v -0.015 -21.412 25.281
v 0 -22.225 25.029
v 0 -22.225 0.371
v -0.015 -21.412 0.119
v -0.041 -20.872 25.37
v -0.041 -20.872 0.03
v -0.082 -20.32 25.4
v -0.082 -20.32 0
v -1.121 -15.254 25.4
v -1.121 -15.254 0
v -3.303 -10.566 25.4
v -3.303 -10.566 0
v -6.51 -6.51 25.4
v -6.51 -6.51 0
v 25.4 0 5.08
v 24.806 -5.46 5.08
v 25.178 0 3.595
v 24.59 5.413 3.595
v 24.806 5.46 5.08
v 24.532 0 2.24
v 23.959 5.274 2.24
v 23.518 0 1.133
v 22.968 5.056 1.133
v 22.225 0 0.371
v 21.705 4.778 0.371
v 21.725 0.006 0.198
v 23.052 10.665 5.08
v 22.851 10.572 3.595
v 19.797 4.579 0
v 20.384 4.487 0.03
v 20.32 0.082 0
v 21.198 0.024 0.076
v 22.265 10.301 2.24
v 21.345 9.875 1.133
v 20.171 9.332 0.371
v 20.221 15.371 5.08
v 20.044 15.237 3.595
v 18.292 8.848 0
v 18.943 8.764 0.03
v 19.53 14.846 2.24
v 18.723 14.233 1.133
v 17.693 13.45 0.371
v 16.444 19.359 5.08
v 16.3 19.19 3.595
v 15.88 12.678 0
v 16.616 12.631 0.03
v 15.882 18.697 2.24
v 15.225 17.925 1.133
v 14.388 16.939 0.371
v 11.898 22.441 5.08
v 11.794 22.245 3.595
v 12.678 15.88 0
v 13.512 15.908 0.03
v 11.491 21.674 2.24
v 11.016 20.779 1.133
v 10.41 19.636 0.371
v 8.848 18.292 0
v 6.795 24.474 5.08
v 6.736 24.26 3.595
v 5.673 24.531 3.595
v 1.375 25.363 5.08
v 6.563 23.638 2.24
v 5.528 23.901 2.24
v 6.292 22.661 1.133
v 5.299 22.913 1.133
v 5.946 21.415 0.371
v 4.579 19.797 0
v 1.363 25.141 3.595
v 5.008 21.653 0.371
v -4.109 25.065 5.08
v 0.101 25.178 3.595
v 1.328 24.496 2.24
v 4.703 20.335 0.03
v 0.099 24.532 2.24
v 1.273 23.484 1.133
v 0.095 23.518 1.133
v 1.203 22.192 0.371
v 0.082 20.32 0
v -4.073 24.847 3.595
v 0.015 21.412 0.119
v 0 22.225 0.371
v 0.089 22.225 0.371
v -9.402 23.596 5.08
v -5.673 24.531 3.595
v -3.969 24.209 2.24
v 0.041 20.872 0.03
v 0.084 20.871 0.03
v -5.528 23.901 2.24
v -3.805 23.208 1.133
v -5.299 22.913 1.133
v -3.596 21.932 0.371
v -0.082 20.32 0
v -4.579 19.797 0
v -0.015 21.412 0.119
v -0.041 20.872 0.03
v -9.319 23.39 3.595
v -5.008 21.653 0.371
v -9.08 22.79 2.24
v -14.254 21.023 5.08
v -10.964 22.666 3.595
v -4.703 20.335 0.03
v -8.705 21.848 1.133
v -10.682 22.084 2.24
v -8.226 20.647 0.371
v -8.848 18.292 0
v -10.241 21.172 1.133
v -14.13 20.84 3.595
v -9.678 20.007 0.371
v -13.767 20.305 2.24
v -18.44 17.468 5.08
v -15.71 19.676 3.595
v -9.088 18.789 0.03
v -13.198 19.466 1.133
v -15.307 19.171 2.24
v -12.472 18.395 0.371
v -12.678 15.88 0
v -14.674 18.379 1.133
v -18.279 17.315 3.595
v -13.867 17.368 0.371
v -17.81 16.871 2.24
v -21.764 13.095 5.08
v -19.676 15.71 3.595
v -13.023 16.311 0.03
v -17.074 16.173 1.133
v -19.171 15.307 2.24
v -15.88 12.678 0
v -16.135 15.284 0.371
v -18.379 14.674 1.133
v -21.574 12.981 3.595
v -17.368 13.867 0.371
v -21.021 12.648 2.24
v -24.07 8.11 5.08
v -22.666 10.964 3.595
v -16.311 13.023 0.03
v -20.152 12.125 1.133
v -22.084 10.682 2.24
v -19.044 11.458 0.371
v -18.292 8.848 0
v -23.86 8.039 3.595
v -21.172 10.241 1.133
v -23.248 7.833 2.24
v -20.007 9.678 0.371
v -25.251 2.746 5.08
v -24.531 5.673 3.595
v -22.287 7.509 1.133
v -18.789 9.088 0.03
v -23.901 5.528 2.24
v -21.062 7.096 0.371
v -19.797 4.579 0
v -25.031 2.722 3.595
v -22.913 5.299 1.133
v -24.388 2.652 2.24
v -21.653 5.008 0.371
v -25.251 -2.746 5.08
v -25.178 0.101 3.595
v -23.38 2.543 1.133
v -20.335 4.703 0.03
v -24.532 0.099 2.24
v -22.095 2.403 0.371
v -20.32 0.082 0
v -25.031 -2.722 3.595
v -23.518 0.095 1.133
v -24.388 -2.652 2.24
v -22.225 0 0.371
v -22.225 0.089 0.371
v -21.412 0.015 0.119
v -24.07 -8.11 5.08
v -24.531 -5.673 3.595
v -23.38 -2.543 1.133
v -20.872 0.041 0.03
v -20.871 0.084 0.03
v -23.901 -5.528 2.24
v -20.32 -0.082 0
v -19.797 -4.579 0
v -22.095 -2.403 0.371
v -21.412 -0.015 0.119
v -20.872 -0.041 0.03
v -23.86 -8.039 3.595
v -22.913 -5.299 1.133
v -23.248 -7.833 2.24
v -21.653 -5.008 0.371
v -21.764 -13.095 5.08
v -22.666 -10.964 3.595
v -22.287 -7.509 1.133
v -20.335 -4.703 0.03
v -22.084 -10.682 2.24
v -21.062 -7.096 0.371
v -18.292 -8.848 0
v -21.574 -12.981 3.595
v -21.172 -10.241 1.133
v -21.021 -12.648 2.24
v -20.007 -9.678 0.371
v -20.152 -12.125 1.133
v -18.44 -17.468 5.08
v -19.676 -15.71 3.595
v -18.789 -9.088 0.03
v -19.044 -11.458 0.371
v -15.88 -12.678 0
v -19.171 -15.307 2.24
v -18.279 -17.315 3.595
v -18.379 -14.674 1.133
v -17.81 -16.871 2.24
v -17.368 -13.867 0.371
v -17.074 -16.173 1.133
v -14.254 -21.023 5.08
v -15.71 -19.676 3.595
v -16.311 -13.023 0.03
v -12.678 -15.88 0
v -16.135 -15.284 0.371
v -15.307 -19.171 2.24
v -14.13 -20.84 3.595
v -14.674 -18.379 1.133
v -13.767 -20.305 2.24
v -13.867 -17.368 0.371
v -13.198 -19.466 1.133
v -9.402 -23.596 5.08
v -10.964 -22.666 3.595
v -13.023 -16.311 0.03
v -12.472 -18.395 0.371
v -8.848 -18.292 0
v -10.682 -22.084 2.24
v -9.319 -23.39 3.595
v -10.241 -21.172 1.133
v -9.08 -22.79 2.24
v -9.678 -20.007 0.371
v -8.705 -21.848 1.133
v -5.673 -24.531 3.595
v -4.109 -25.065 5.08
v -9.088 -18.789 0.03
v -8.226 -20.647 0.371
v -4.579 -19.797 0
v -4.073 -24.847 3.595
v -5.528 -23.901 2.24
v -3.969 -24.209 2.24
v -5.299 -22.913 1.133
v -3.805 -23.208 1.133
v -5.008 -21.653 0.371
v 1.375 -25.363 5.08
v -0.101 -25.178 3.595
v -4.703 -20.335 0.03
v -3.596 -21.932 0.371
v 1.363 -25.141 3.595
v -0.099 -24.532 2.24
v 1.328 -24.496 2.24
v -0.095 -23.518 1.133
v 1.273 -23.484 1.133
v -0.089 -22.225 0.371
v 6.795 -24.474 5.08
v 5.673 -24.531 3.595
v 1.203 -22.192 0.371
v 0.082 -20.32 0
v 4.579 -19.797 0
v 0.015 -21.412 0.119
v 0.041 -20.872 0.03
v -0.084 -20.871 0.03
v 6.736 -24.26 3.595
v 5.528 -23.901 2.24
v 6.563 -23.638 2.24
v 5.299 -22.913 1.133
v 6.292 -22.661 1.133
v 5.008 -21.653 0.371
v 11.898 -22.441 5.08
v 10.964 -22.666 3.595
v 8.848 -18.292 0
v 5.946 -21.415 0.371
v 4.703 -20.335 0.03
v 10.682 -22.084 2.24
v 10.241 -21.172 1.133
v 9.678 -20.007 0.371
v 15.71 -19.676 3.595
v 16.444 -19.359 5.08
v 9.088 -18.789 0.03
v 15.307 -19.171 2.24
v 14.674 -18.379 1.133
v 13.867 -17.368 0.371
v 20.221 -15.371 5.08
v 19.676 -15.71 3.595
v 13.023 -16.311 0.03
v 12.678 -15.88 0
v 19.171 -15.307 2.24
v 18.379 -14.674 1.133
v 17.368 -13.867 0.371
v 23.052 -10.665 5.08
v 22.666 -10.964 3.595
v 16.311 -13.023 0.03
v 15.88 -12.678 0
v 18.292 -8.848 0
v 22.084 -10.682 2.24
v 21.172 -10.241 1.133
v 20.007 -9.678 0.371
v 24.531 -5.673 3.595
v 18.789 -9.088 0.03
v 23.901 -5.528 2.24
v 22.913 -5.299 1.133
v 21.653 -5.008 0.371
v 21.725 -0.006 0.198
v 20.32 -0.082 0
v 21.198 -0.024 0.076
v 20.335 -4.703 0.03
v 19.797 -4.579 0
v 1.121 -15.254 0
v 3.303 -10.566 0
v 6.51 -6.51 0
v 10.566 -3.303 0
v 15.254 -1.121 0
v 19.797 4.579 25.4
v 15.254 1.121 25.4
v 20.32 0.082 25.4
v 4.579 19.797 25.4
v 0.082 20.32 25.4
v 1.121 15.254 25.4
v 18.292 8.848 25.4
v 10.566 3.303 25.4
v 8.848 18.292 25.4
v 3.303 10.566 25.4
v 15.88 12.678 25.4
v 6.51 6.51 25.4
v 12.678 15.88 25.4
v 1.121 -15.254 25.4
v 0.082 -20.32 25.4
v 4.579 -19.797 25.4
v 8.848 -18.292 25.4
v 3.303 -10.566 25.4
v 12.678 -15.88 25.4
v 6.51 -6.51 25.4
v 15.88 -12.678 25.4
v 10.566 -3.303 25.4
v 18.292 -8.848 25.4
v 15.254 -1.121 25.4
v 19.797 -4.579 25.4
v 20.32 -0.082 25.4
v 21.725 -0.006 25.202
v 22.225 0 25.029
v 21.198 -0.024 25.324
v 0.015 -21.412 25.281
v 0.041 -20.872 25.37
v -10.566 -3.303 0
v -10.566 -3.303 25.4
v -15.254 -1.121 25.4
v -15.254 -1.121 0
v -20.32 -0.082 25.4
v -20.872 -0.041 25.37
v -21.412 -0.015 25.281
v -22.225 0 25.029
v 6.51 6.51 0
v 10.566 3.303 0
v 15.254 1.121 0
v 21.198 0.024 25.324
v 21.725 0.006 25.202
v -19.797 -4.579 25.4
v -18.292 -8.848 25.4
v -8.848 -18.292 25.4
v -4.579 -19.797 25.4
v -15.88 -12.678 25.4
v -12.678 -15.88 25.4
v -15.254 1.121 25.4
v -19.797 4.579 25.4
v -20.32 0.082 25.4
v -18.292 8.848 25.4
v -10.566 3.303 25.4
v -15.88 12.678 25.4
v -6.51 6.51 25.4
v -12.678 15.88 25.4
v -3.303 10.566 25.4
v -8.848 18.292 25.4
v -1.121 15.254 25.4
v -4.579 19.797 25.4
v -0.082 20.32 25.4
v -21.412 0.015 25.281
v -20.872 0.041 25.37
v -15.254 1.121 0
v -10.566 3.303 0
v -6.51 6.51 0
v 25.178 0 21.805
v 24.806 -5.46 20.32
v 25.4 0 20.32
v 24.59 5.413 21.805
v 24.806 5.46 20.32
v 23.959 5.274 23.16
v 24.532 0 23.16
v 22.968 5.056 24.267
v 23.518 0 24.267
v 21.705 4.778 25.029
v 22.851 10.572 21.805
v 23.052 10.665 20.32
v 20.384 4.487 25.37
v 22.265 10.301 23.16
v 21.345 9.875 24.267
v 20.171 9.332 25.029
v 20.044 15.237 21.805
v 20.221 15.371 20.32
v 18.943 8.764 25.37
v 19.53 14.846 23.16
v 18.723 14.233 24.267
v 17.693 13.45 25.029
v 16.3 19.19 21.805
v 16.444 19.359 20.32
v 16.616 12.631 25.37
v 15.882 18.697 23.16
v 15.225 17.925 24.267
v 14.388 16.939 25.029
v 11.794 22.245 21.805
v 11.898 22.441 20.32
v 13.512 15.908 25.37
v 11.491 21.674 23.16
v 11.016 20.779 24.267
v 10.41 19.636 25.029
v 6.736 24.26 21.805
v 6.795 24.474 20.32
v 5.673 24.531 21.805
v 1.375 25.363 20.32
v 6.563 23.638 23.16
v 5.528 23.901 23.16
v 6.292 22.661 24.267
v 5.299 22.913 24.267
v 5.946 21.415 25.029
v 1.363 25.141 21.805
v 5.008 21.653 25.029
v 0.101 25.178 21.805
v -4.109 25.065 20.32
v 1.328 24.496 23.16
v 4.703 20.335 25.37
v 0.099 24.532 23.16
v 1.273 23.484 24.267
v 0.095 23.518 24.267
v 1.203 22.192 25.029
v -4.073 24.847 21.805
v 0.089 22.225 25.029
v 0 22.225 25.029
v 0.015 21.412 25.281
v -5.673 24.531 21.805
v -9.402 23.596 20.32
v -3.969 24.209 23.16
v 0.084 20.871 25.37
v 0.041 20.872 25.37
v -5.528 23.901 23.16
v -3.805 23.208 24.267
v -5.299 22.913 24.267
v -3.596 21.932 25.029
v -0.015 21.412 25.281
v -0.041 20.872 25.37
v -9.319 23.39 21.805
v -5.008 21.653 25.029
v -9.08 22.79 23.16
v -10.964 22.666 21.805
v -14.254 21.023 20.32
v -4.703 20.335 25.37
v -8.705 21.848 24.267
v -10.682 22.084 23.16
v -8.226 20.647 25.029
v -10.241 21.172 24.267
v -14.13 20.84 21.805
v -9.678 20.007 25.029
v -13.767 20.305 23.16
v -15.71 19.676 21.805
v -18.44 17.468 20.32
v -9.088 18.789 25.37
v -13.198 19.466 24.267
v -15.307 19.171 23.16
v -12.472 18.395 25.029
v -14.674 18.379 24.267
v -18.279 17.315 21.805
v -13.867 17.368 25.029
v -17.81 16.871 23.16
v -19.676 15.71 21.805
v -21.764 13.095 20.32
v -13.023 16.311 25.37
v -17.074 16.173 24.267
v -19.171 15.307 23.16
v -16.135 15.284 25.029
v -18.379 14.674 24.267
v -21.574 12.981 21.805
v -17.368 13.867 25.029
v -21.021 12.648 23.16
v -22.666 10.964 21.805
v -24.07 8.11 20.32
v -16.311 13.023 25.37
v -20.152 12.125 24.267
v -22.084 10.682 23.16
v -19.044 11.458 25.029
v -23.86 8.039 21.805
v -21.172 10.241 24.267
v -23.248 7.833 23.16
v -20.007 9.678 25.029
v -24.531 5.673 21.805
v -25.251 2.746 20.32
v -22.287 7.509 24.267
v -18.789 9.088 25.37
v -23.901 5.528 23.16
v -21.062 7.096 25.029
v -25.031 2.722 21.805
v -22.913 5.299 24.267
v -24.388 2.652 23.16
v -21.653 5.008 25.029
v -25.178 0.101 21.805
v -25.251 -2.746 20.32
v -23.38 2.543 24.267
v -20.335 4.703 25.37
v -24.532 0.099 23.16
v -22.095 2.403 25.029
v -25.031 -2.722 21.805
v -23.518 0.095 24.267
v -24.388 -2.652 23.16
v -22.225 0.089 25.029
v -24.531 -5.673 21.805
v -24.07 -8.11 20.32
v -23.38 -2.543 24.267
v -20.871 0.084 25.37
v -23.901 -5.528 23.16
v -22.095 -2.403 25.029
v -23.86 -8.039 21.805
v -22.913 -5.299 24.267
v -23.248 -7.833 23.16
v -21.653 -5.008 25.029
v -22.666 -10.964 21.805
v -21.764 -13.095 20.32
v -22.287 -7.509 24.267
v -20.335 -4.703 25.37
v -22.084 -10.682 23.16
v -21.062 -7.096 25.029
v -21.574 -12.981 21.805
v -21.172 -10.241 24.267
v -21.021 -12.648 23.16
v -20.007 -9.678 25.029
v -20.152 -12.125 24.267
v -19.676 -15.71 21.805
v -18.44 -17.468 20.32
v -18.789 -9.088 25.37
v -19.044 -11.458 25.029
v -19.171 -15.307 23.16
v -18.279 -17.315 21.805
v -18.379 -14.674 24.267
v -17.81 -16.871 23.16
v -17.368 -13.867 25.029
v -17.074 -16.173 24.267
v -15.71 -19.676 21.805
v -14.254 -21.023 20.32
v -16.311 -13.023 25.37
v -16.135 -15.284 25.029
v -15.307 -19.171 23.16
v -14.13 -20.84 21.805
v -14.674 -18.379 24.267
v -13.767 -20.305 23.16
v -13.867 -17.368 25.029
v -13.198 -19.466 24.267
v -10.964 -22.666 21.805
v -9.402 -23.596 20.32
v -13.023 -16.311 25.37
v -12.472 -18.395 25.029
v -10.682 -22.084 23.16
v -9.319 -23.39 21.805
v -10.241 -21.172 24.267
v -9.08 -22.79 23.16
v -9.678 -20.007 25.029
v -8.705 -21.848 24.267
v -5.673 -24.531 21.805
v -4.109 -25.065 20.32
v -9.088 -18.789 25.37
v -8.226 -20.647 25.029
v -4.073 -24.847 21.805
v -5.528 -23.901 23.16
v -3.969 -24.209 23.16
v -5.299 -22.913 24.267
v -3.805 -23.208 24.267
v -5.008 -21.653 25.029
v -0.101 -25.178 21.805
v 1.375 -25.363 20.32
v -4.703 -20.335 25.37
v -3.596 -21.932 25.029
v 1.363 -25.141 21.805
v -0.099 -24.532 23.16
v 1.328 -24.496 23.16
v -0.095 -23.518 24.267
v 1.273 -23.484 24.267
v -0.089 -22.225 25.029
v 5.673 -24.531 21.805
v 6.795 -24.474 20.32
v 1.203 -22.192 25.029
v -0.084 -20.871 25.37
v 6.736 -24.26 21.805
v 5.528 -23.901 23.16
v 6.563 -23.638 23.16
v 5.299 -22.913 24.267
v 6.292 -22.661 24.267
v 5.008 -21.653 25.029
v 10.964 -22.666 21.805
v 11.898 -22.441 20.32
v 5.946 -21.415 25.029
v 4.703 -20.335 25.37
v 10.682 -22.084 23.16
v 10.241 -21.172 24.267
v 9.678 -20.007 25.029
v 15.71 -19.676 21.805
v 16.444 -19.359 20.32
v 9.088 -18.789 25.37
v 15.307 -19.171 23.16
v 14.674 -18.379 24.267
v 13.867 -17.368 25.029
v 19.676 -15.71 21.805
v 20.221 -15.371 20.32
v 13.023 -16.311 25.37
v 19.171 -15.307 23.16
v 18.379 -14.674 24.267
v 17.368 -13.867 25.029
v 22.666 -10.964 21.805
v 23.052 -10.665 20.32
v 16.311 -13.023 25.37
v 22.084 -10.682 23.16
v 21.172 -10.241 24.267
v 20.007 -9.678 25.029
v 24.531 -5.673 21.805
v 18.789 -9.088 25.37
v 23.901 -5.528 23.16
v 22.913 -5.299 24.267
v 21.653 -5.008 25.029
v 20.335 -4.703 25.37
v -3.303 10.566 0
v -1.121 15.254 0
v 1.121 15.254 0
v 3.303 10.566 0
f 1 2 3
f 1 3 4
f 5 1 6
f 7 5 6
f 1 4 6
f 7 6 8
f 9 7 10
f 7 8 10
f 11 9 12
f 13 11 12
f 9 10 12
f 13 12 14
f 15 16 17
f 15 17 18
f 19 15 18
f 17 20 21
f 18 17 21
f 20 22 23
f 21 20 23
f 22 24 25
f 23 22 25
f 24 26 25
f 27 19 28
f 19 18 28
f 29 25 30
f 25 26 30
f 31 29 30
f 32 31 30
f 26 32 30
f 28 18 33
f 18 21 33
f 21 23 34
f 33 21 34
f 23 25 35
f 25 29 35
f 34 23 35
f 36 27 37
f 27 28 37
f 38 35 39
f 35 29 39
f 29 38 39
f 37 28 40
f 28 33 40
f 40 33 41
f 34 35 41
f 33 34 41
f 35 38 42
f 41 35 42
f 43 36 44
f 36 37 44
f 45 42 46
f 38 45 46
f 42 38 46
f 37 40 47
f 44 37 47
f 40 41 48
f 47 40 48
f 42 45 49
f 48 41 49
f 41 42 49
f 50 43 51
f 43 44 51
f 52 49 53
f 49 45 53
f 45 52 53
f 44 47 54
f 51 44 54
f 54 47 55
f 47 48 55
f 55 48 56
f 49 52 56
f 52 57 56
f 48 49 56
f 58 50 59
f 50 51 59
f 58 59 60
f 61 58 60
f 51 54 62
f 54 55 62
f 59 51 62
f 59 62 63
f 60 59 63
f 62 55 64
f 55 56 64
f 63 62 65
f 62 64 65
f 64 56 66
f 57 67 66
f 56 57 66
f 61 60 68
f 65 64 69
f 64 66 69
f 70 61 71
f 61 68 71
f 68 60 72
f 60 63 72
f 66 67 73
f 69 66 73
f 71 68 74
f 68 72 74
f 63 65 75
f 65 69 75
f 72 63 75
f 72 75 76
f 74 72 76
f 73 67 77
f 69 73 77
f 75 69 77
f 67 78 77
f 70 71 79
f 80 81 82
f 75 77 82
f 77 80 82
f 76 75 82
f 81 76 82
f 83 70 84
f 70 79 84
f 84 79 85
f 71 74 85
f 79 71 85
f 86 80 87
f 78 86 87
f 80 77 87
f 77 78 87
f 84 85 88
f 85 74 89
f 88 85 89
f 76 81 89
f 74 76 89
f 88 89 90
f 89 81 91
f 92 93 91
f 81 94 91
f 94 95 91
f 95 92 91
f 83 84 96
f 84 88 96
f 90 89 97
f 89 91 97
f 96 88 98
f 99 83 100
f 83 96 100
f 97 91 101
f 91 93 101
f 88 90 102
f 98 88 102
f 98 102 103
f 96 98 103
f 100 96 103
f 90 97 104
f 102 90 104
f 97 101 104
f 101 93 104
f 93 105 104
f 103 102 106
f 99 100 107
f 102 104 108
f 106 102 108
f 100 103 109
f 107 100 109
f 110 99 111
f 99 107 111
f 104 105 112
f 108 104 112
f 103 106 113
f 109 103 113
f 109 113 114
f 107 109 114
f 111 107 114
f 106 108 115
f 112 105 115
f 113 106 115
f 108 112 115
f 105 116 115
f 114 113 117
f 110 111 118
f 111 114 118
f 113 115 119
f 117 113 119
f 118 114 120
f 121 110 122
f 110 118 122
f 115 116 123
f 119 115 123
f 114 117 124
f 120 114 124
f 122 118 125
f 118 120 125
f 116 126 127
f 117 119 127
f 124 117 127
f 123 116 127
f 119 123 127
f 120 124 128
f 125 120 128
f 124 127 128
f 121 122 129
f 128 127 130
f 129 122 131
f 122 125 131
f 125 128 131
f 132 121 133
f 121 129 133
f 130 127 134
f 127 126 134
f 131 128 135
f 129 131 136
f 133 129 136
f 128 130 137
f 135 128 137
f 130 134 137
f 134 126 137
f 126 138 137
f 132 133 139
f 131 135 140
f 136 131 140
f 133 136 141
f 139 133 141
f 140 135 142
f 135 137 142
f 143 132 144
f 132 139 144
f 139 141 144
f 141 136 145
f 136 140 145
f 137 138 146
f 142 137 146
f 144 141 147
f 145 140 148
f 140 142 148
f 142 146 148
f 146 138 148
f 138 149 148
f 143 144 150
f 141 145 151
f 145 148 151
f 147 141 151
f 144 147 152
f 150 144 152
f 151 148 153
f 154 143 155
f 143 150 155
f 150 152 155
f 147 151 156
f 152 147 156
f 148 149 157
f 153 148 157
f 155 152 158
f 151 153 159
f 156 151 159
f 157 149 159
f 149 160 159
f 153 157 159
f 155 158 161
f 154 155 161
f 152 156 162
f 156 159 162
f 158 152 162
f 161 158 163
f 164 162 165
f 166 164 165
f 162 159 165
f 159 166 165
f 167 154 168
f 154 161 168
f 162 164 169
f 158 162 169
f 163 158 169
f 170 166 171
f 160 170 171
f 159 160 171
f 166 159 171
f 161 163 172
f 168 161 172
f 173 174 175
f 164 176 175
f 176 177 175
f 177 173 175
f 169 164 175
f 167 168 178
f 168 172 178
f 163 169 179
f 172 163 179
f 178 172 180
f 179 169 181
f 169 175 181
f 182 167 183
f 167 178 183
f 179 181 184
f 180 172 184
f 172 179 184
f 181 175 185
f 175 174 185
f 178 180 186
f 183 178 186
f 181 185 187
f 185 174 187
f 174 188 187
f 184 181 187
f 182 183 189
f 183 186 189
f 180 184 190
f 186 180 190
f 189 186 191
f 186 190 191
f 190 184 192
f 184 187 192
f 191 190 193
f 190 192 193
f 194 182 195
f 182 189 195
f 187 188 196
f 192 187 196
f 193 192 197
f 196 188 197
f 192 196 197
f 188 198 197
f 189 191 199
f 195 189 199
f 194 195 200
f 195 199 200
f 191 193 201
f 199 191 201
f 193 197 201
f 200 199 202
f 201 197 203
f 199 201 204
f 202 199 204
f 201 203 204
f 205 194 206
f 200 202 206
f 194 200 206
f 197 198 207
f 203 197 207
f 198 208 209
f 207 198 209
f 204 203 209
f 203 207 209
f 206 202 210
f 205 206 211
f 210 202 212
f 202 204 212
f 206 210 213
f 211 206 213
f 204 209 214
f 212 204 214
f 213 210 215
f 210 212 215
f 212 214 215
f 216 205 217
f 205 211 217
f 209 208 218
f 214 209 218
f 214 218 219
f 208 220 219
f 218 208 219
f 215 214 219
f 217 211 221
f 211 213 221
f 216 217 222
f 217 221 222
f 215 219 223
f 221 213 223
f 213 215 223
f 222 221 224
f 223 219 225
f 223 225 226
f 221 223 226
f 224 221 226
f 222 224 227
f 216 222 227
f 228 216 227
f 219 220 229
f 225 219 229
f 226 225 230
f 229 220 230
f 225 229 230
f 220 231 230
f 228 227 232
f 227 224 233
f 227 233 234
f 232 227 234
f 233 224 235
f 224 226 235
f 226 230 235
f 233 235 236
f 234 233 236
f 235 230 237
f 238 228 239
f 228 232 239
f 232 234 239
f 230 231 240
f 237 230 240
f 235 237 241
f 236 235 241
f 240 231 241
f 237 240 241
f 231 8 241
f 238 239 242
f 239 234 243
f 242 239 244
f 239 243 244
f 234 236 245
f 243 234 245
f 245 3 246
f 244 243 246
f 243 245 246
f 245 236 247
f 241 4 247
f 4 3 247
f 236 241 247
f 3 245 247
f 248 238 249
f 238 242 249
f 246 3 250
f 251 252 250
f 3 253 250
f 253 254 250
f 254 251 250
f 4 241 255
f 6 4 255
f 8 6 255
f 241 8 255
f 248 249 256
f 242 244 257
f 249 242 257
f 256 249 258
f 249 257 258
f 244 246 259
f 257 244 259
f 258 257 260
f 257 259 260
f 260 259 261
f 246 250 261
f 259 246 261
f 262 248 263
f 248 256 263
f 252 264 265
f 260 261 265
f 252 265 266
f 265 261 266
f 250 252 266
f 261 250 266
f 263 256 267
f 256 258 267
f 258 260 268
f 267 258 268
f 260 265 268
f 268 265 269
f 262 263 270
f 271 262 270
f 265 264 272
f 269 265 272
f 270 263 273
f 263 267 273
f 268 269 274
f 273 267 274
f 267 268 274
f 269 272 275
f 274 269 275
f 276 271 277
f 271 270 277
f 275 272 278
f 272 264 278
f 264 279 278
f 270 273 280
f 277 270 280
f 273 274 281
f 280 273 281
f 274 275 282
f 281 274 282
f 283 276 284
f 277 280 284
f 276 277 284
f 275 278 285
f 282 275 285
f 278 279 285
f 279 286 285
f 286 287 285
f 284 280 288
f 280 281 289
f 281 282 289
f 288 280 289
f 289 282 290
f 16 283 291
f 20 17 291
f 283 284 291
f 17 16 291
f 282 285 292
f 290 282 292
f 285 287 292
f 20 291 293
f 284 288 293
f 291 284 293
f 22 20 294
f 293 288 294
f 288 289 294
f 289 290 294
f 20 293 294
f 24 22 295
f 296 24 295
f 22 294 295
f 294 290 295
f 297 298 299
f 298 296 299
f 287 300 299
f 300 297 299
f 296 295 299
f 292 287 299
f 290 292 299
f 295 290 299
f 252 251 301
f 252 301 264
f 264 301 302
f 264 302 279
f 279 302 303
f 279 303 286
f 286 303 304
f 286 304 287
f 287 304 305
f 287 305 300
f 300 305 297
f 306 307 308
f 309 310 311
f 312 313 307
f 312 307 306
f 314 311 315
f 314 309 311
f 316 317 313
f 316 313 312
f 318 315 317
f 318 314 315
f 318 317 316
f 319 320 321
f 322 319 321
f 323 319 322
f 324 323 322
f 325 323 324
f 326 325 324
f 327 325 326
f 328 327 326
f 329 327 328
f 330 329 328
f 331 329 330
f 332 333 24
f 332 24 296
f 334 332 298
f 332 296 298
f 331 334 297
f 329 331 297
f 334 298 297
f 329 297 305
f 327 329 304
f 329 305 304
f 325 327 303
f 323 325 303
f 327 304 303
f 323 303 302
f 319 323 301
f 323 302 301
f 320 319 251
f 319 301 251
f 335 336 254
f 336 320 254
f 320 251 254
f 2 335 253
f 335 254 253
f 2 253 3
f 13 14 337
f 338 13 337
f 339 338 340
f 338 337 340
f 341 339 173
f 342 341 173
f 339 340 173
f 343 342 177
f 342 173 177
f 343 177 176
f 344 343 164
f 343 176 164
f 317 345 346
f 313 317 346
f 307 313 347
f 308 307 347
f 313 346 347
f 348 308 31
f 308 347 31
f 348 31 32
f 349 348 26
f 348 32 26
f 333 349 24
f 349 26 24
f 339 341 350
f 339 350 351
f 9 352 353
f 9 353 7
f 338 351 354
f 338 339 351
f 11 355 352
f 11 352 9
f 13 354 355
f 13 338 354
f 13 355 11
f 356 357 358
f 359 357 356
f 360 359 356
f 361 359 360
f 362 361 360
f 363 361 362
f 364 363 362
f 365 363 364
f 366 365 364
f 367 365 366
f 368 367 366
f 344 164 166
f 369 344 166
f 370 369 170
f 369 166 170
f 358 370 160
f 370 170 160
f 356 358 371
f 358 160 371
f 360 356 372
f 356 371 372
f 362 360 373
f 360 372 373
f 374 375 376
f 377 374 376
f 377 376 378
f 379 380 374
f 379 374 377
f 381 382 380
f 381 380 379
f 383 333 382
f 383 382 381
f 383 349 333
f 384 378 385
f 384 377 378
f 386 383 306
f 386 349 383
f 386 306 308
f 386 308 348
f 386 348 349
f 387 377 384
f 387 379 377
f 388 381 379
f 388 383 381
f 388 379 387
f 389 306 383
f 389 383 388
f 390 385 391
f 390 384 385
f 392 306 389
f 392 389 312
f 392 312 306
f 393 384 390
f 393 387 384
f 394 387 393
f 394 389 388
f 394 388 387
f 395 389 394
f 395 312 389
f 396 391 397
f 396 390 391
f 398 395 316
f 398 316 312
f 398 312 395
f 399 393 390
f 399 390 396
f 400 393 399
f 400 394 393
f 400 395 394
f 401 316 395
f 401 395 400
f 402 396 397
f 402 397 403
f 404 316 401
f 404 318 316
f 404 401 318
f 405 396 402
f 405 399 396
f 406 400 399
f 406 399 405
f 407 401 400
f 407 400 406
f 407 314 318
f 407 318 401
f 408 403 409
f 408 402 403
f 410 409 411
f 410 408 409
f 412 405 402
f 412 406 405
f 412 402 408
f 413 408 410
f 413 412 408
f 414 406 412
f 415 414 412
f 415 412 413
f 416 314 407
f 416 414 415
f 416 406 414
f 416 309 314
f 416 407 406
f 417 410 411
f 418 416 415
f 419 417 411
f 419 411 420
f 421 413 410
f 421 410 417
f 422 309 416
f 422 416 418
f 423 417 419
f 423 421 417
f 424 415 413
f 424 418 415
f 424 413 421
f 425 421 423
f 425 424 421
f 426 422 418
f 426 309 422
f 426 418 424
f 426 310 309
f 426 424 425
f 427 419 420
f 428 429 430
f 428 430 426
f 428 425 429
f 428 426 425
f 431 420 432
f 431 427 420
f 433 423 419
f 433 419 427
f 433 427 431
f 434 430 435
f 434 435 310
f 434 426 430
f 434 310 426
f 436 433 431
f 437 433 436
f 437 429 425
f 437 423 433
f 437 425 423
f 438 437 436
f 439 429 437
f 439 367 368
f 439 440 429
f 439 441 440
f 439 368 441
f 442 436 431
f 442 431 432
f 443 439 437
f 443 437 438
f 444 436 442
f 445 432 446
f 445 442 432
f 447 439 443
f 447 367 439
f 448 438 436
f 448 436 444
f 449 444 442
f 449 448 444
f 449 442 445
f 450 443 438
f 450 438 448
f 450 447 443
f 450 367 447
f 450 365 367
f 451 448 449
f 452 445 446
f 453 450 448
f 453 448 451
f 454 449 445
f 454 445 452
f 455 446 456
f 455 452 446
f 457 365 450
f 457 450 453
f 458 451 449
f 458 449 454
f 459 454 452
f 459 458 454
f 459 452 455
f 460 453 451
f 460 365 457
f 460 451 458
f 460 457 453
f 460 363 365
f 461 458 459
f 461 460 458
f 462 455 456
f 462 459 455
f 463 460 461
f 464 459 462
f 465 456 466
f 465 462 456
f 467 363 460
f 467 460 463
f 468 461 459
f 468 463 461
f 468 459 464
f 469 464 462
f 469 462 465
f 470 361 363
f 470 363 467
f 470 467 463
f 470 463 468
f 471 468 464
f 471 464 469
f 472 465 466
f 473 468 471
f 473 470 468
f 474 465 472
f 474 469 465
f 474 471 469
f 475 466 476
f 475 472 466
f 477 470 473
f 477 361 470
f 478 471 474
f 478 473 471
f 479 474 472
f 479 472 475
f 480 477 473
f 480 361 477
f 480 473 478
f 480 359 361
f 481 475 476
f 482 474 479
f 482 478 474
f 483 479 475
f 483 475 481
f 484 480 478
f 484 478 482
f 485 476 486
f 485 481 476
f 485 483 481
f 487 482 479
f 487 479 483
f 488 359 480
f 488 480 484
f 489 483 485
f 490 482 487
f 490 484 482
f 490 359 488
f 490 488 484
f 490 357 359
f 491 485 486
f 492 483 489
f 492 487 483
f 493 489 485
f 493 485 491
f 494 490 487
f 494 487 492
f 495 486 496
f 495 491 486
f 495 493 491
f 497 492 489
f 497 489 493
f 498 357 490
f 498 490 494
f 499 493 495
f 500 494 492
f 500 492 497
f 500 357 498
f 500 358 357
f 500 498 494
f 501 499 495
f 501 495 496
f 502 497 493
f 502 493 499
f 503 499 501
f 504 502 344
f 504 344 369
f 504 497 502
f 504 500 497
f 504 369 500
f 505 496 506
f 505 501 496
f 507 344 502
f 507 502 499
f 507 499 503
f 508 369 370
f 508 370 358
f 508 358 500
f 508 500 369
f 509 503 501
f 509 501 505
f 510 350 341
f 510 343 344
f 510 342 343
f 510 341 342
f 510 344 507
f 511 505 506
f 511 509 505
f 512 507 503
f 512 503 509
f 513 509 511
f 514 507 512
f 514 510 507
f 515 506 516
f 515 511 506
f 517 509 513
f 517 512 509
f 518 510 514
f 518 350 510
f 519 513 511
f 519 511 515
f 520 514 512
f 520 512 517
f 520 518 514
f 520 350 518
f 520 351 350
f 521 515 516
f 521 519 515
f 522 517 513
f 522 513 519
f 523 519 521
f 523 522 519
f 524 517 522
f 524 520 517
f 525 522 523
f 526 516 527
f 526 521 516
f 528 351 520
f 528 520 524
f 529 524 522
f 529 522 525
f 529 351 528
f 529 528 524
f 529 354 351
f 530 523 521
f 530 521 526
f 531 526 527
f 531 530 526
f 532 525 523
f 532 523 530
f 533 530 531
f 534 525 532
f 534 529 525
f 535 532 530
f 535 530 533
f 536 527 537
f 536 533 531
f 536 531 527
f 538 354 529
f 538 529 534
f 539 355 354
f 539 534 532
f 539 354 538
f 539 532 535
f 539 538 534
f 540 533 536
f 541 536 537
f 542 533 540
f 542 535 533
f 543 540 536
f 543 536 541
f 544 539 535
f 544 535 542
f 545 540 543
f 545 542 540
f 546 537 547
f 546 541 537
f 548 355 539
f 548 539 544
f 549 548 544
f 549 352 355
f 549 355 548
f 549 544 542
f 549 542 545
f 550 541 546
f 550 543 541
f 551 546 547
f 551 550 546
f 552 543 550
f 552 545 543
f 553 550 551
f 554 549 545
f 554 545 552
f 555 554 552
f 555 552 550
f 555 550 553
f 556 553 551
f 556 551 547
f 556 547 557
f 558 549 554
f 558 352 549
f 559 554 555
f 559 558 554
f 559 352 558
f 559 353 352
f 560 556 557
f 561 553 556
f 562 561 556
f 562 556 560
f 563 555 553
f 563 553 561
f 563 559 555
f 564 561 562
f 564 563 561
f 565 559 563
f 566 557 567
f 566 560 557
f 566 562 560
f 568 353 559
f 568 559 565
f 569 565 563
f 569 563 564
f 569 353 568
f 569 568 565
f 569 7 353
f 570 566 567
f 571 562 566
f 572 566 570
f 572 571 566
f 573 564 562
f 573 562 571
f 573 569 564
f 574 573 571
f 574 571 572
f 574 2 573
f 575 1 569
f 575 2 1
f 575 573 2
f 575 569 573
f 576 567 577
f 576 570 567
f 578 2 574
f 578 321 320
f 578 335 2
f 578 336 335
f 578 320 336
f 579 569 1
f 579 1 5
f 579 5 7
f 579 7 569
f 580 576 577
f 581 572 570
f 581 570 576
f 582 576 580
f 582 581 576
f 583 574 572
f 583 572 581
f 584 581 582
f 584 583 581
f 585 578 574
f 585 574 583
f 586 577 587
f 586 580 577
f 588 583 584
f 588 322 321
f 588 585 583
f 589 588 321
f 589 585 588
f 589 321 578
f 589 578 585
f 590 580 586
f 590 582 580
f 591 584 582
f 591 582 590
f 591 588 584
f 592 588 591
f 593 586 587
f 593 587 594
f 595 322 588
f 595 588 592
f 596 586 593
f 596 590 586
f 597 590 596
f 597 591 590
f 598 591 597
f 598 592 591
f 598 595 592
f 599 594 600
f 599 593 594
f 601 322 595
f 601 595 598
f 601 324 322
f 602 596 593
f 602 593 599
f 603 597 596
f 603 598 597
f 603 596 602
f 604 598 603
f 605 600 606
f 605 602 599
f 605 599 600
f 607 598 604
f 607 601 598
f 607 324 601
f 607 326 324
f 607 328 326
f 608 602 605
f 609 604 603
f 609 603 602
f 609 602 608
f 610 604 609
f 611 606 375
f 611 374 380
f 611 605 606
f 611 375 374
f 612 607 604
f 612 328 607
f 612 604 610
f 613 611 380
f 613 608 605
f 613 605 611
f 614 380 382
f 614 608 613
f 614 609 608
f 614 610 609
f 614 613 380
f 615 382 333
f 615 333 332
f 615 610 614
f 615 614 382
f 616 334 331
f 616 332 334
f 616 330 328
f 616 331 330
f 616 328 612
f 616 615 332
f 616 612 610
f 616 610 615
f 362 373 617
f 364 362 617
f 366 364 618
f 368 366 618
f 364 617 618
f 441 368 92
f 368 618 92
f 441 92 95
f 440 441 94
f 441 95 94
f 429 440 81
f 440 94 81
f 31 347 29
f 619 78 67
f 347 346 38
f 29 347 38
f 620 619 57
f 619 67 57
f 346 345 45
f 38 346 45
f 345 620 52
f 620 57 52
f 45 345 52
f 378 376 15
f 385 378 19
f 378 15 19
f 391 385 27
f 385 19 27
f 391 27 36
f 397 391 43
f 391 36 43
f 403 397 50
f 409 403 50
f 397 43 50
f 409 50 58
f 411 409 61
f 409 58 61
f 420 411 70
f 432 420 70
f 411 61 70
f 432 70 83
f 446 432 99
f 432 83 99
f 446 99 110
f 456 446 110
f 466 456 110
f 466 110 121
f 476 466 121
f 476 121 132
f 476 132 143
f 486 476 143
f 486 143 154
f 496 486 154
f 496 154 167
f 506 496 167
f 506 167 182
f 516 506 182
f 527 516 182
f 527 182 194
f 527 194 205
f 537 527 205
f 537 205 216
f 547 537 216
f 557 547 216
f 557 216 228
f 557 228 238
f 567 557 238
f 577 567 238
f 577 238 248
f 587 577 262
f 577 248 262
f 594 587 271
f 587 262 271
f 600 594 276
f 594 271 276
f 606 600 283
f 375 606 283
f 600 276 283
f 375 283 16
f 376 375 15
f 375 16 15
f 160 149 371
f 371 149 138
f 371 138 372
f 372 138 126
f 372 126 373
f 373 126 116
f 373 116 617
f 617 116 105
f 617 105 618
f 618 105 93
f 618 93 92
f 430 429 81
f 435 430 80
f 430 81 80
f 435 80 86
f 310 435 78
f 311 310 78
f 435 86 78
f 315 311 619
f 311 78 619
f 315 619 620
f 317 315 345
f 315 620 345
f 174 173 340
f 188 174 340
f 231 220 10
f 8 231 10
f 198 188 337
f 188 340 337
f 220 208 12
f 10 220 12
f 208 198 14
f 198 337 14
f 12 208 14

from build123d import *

# Parameters (mm, degrees)
F0_R     = 25.4
F1_DEPTH = 25.4


# Not quite as in the source:
# - a fillet or chamfer that OpenCascade refuses, or shapes differently, is made with other operations: its cross-section is extruded or revolved along the edge and cut away or added


with BuildPart() as f1:
    # F0 (on Top) → F1 (new body)
    with BuildSketch(Plane.XY):
        Circle(F0_R)
        with BuildLine():
            ThreePointArc((0, 22.225), (15.7154482119, 15.7154482119), (22.225, 0))
            ThreePointArc((22.225, 0), (15.7154482119, -15.7154482119), (0, -22.225))
            ThreePointArc((0, -22.225), (-15.7154482119, -15.7154482119), (-22.225, 0))
            ThreePointArc((-22.225, 0), (-15.7154482119, 15.7154482119), (0, 22.225))
        make_face(mode=Mode.SUBTRACT)
        with BuildLine():
            ThreePointArc((-6.5095517729, 6.5095518034), (-1.6917773858, 13.7198607256), (0, 22.225))
            ThreePointArc((0, 22.225), (-15.7154482119, 15.7154482119), (-22.225, 0))
            ThreePointArc((-22.225, 0), (-13.7198607057, 1.6917773941), (-6.5095517729, 6.5095518034))
        make_face()
        with BuildLine():
            ThreePointArc((6.509551813, 6.5095517633), (13.7198607319, 1.6917773832), (22.225, 0))
            ThreePointArc((22.225, 0), (15.7154482119, 15.7154482119), (0, 22.225))
            ThreePointArc((0, 22.225), (1.6917773967, 13.7198606994), (6.509551813, 6.5095517633))
        make_face()
        with BuildLine():
            ThreePointArc((-22.225, 0), (-15.7154482119, -15.7154482119), (0, -22.225))
            ThreePointArc((0, -22.225), (-1.6917773909, -13.7198607133), (-6.5095517917, -6.5095517845))
            ThreePointArc((-6.5095517917, -6.5095517845), (-13.719860718, -1.691777389), (-22.225, 0))
        make_face()
        with BuildLine():
            ThreePointArc((0, -22.225), (15.7154482119, -15.7154482119), (22.225, 0))
            ThreePointArc((22.225, 0), (13.7198607157, -1.6917773899), (6.5095517881, -6.5095517881))
            ThreePointArc((6.5095517881, -6.5095517881), (1.6917773899, -13.7198607157), (0, -22.225))
        make_face()
    extrude(amount=F1_DEPTH)

    # F2: fillet of radius 5.08 on 2 edges, made by hand

    # F2_s1 → F2_t2 (revolve, cut)
    with BuildSketch(Plane.XZ):
        with BuildLine():
            ThreePointArc((25.4, 20.32), (23.9121024484, 23.9121024484), (20.32, 25.4))
            Line((20.32, 25.4), (25.4, 25.4))
            Line((25.4, 25.4), (25.4, 20.32))
        make_face()
    revolve(axis=Axis((0, 0, 25.4), (0, 0, 1)), mode=Mode.SUBTRACT)

    # F2_s3 → F2_t4 (revolve, cut)
    with BuildSketch(Plane.XZ):
        with BuildLine():
            ThreePointArc((25.4, 5.08), (23.9121024484, 1.4878975516), (20.32, 0))
            Line((20.32, 0), (25.4, 0))
            Line((25.4, 0), (25.4, 5.08))
        make_face()
    revolve(axis=Axis((0, 0, 0), (0, 0, 1)), mode=Mode.SUBTRACT)


solid = f1.part
